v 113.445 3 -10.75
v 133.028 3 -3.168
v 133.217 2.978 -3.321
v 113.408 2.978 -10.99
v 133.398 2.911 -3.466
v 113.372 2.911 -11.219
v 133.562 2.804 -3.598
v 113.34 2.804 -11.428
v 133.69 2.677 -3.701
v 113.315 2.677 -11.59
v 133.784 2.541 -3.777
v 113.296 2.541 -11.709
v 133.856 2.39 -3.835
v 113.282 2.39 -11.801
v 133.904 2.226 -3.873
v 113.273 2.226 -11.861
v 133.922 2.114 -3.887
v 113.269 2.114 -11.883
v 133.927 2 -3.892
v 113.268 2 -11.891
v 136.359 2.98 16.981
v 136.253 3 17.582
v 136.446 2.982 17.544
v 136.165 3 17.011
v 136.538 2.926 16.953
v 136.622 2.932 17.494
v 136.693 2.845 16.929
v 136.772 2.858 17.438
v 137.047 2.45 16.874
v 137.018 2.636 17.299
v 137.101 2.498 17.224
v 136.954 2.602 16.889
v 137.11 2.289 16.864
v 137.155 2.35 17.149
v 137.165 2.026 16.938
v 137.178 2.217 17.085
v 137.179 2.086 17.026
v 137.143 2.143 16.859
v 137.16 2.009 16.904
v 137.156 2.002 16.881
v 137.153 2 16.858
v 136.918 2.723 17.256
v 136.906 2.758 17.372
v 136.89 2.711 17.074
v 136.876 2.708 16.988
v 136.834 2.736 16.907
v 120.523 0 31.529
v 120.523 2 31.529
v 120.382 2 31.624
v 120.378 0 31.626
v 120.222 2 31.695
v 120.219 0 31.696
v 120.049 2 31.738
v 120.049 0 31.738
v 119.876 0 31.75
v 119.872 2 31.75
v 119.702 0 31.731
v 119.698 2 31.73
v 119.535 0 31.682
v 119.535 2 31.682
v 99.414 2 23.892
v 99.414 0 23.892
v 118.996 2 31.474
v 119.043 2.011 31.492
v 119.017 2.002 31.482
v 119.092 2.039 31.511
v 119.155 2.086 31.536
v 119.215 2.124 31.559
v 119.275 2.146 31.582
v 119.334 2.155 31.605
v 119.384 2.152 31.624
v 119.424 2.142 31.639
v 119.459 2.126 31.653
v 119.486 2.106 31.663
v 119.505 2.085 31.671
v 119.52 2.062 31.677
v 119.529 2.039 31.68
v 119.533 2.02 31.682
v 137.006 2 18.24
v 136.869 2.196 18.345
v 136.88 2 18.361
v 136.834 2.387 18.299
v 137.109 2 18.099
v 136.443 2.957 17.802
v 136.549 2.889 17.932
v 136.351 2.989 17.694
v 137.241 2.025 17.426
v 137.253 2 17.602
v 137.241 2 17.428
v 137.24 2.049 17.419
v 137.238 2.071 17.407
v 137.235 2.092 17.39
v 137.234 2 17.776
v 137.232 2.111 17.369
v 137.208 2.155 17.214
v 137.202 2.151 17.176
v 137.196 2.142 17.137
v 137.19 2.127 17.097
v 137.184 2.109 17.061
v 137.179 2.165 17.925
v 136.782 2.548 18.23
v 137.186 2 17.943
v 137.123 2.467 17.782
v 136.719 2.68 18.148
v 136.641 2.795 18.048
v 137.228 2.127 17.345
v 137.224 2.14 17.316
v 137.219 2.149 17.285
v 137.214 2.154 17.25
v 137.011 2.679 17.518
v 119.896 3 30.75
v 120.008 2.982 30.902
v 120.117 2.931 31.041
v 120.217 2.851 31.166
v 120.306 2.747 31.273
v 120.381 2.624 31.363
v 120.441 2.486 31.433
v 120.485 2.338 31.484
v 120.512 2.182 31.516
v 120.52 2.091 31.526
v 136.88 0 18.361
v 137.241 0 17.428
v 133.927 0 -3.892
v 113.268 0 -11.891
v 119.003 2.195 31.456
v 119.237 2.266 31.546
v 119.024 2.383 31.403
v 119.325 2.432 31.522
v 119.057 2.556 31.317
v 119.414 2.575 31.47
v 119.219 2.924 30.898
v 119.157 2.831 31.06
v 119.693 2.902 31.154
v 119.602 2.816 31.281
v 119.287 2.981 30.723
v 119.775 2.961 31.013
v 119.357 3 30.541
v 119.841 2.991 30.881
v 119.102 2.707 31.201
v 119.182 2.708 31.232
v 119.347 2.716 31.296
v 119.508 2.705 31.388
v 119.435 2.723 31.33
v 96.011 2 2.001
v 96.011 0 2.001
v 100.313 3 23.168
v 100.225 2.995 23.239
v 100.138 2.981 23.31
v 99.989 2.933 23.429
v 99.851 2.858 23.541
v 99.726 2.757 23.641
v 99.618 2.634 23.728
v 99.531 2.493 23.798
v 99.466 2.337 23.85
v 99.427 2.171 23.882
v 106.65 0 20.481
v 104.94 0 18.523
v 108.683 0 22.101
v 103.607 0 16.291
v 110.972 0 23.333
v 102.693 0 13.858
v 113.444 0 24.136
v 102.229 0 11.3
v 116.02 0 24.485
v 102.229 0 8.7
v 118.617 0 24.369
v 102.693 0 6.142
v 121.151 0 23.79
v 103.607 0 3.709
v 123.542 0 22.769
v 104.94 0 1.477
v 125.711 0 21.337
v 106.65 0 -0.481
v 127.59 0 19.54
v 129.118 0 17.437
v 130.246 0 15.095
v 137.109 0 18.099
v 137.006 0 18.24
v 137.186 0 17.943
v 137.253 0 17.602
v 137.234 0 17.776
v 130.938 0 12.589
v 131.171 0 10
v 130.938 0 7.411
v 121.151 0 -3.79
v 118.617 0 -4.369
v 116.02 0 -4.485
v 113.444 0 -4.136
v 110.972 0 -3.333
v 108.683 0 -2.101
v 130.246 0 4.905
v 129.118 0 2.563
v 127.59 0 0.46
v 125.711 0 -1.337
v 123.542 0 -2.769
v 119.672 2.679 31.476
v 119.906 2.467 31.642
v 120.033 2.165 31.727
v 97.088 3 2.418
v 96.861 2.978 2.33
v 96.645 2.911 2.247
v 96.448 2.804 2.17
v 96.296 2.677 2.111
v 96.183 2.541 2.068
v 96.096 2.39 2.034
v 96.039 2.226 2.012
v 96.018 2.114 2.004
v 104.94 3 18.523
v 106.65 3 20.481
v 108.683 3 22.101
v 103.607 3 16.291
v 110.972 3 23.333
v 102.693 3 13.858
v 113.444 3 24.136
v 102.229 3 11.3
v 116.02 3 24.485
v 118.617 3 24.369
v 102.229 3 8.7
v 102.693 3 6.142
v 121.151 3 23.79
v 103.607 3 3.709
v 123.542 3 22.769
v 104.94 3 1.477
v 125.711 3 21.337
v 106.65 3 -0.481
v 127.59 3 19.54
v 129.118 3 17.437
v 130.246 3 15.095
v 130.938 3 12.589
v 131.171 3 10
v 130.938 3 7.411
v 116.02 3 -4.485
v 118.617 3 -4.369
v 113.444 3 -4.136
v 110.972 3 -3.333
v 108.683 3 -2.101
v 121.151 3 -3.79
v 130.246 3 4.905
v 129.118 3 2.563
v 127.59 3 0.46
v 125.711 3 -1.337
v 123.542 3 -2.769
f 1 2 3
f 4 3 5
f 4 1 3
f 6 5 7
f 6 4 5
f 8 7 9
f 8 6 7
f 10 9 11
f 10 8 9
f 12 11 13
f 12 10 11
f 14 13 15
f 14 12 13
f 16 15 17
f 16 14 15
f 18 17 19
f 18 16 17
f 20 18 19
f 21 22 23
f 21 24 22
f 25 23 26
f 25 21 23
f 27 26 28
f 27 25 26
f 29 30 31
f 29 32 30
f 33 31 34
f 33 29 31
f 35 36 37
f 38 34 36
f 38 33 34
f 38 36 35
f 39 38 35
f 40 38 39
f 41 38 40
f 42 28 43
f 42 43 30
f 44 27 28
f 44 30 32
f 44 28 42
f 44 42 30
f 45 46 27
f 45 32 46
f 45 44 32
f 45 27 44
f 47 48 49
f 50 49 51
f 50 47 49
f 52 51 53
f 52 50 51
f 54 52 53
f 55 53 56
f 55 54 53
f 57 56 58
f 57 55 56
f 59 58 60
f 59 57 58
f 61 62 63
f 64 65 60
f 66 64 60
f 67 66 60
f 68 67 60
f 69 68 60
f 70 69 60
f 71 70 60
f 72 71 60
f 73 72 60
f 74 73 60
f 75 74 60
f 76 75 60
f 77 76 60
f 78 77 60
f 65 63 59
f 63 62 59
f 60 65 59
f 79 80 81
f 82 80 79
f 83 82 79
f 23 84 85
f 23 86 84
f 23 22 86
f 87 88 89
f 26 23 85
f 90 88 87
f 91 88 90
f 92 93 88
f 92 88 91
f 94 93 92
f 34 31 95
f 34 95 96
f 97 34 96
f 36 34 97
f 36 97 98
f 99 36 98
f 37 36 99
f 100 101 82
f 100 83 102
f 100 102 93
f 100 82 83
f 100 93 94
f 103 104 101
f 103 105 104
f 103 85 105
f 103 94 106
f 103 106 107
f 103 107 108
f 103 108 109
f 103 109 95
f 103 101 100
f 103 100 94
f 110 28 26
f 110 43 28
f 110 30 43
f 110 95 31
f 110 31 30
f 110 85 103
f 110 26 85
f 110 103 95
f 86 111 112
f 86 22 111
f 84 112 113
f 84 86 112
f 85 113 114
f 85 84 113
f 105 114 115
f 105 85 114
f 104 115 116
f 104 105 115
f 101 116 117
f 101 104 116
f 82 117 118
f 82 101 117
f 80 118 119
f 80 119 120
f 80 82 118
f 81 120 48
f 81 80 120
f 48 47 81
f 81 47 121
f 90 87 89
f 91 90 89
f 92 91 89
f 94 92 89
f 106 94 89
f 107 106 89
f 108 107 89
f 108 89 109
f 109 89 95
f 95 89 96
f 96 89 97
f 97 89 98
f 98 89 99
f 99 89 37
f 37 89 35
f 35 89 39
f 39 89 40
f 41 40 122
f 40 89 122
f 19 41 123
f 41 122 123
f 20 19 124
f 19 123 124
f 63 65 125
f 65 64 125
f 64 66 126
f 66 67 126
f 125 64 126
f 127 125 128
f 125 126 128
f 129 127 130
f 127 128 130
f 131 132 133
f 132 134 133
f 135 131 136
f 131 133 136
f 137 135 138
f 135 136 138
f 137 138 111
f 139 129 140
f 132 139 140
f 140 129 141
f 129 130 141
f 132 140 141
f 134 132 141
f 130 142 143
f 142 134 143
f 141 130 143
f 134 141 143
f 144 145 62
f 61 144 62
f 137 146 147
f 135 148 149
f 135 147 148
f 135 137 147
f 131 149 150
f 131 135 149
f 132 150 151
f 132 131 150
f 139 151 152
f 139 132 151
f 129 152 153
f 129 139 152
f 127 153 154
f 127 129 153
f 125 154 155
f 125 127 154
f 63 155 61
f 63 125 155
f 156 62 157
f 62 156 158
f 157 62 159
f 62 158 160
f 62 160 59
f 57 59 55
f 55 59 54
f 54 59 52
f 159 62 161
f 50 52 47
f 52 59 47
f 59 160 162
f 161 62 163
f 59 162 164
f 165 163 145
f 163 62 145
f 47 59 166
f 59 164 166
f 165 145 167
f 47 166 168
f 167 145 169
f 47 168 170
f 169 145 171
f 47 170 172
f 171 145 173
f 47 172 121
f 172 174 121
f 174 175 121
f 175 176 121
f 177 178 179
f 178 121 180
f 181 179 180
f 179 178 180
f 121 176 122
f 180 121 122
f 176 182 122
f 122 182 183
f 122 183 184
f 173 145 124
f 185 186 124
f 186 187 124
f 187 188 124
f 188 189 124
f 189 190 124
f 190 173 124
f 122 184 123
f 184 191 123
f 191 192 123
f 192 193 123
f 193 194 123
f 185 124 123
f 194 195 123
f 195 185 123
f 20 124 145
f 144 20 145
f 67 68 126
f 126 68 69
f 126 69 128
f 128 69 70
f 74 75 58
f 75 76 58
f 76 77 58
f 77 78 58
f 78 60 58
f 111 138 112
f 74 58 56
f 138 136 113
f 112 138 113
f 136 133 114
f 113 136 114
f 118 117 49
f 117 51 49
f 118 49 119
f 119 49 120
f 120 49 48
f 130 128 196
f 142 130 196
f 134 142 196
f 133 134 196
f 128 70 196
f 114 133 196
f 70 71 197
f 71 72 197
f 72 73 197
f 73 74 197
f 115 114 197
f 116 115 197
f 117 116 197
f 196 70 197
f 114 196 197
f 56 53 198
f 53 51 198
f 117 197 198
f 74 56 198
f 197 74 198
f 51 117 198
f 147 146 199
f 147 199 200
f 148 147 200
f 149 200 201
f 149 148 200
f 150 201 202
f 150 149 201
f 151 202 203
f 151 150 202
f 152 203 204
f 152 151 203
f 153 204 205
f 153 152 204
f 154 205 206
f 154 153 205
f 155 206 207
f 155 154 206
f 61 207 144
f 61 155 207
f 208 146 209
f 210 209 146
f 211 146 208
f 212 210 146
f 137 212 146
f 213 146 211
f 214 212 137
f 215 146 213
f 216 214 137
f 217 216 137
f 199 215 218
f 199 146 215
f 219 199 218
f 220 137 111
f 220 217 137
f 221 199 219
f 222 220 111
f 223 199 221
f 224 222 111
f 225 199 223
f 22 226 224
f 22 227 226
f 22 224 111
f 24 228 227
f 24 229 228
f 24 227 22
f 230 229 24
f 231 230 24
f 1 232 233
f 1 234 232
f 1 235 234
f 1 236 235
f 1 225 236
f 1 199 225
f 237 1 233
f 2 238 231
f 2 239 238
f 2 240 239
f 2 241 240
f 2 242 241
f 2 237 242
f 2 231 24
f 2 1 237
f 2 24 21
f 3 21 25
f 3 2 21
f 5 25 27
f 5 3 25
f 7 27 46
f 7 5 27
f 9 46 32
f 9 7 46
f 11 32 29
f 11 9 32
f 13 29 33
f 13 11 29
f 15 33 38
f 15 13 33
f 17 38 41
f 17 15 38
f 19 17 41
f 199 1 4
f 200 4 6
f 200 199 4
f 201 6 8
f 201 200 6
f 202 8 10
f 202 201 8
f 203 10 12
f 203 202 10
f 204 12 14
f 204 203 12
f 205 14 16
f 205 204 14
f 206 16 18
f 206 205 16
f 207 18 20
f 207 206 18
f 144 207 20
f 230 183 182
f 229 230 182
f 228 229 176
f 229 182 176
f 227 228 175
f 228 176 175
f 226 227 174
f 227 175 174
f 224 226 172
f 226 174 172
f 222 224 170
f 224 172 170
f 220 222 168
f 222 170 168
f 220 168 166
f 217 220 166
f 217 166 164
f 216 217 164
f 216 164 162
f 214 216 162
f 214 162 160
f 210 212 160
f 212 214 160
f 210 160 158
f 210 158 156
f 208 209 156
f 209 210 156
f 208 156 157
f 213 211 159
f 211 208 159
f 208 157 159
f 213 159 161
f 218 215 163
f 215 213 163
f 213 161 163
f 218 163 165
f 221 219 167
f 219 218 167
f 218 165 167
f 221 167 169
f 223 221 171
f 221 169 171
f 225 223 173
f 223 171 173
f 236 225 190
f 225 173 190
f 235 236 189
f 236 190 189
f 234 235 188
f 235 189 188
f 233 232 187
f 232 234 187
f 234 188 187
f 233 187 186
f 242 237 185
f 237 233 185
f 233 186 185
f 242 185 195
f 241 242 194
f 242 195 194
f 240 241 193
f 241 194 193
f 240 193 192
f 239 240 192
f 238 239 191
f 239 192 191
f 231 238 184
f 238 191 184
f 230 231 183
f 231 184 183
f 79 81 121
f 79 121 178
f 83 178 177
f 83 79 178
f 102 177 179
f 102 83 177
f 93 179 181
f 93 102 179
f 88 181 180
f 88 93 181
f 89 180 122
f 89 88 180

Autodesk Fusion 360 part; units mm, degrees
sketch "Sketch1" plane through (0, 0, 0) normal (0, 1, 0) x (1, 0, 0)
  circle A0 centre (116.6706, -10) radius 14.5
  line L0 (137.33, -17.9988) -> (133.9274, 3.8922)
  line L1 (133.9274, 3.8922) -> (113.268, 11.8909)
  line L2 (113.268, 11.8909) -> (96.0112, -2.0012)
  line L3 (96.0112, -2.0012) -> (99.4138, -23.8922)
  line L4 (99.4138, -23.8922) -> (120.0732, -31.8909)
  line L5 (120.0732, -31.8909) -> (137.33, -17.9988)
  point P0 (116.6706, -10)
  dimension "d140" = 29
extrude "Extrude1" add sketch "Sketch1" along normal blind 3
fillet "Fillet1" radius 1 1 edges at (128.7016, 3, 24.9448)
fillet "Fillet2" radius 1 9 edges at (109.2051, 3, 27.6831) (119.7578, 2.7071, 31.7688) (120.0732, 1, 31.8909) (137.33, 1, 17.9988) (137.2781, 2.7071, 17.6646) (135.54, 3, 6.4828) (123.5977, 3, -7.8916) (97.7125, 3, 12.9467) (104.6396, 3, -4.9448)
equation "d140 = buttonOD + 1 mm"
equation "buttonOD = 28 mm"
